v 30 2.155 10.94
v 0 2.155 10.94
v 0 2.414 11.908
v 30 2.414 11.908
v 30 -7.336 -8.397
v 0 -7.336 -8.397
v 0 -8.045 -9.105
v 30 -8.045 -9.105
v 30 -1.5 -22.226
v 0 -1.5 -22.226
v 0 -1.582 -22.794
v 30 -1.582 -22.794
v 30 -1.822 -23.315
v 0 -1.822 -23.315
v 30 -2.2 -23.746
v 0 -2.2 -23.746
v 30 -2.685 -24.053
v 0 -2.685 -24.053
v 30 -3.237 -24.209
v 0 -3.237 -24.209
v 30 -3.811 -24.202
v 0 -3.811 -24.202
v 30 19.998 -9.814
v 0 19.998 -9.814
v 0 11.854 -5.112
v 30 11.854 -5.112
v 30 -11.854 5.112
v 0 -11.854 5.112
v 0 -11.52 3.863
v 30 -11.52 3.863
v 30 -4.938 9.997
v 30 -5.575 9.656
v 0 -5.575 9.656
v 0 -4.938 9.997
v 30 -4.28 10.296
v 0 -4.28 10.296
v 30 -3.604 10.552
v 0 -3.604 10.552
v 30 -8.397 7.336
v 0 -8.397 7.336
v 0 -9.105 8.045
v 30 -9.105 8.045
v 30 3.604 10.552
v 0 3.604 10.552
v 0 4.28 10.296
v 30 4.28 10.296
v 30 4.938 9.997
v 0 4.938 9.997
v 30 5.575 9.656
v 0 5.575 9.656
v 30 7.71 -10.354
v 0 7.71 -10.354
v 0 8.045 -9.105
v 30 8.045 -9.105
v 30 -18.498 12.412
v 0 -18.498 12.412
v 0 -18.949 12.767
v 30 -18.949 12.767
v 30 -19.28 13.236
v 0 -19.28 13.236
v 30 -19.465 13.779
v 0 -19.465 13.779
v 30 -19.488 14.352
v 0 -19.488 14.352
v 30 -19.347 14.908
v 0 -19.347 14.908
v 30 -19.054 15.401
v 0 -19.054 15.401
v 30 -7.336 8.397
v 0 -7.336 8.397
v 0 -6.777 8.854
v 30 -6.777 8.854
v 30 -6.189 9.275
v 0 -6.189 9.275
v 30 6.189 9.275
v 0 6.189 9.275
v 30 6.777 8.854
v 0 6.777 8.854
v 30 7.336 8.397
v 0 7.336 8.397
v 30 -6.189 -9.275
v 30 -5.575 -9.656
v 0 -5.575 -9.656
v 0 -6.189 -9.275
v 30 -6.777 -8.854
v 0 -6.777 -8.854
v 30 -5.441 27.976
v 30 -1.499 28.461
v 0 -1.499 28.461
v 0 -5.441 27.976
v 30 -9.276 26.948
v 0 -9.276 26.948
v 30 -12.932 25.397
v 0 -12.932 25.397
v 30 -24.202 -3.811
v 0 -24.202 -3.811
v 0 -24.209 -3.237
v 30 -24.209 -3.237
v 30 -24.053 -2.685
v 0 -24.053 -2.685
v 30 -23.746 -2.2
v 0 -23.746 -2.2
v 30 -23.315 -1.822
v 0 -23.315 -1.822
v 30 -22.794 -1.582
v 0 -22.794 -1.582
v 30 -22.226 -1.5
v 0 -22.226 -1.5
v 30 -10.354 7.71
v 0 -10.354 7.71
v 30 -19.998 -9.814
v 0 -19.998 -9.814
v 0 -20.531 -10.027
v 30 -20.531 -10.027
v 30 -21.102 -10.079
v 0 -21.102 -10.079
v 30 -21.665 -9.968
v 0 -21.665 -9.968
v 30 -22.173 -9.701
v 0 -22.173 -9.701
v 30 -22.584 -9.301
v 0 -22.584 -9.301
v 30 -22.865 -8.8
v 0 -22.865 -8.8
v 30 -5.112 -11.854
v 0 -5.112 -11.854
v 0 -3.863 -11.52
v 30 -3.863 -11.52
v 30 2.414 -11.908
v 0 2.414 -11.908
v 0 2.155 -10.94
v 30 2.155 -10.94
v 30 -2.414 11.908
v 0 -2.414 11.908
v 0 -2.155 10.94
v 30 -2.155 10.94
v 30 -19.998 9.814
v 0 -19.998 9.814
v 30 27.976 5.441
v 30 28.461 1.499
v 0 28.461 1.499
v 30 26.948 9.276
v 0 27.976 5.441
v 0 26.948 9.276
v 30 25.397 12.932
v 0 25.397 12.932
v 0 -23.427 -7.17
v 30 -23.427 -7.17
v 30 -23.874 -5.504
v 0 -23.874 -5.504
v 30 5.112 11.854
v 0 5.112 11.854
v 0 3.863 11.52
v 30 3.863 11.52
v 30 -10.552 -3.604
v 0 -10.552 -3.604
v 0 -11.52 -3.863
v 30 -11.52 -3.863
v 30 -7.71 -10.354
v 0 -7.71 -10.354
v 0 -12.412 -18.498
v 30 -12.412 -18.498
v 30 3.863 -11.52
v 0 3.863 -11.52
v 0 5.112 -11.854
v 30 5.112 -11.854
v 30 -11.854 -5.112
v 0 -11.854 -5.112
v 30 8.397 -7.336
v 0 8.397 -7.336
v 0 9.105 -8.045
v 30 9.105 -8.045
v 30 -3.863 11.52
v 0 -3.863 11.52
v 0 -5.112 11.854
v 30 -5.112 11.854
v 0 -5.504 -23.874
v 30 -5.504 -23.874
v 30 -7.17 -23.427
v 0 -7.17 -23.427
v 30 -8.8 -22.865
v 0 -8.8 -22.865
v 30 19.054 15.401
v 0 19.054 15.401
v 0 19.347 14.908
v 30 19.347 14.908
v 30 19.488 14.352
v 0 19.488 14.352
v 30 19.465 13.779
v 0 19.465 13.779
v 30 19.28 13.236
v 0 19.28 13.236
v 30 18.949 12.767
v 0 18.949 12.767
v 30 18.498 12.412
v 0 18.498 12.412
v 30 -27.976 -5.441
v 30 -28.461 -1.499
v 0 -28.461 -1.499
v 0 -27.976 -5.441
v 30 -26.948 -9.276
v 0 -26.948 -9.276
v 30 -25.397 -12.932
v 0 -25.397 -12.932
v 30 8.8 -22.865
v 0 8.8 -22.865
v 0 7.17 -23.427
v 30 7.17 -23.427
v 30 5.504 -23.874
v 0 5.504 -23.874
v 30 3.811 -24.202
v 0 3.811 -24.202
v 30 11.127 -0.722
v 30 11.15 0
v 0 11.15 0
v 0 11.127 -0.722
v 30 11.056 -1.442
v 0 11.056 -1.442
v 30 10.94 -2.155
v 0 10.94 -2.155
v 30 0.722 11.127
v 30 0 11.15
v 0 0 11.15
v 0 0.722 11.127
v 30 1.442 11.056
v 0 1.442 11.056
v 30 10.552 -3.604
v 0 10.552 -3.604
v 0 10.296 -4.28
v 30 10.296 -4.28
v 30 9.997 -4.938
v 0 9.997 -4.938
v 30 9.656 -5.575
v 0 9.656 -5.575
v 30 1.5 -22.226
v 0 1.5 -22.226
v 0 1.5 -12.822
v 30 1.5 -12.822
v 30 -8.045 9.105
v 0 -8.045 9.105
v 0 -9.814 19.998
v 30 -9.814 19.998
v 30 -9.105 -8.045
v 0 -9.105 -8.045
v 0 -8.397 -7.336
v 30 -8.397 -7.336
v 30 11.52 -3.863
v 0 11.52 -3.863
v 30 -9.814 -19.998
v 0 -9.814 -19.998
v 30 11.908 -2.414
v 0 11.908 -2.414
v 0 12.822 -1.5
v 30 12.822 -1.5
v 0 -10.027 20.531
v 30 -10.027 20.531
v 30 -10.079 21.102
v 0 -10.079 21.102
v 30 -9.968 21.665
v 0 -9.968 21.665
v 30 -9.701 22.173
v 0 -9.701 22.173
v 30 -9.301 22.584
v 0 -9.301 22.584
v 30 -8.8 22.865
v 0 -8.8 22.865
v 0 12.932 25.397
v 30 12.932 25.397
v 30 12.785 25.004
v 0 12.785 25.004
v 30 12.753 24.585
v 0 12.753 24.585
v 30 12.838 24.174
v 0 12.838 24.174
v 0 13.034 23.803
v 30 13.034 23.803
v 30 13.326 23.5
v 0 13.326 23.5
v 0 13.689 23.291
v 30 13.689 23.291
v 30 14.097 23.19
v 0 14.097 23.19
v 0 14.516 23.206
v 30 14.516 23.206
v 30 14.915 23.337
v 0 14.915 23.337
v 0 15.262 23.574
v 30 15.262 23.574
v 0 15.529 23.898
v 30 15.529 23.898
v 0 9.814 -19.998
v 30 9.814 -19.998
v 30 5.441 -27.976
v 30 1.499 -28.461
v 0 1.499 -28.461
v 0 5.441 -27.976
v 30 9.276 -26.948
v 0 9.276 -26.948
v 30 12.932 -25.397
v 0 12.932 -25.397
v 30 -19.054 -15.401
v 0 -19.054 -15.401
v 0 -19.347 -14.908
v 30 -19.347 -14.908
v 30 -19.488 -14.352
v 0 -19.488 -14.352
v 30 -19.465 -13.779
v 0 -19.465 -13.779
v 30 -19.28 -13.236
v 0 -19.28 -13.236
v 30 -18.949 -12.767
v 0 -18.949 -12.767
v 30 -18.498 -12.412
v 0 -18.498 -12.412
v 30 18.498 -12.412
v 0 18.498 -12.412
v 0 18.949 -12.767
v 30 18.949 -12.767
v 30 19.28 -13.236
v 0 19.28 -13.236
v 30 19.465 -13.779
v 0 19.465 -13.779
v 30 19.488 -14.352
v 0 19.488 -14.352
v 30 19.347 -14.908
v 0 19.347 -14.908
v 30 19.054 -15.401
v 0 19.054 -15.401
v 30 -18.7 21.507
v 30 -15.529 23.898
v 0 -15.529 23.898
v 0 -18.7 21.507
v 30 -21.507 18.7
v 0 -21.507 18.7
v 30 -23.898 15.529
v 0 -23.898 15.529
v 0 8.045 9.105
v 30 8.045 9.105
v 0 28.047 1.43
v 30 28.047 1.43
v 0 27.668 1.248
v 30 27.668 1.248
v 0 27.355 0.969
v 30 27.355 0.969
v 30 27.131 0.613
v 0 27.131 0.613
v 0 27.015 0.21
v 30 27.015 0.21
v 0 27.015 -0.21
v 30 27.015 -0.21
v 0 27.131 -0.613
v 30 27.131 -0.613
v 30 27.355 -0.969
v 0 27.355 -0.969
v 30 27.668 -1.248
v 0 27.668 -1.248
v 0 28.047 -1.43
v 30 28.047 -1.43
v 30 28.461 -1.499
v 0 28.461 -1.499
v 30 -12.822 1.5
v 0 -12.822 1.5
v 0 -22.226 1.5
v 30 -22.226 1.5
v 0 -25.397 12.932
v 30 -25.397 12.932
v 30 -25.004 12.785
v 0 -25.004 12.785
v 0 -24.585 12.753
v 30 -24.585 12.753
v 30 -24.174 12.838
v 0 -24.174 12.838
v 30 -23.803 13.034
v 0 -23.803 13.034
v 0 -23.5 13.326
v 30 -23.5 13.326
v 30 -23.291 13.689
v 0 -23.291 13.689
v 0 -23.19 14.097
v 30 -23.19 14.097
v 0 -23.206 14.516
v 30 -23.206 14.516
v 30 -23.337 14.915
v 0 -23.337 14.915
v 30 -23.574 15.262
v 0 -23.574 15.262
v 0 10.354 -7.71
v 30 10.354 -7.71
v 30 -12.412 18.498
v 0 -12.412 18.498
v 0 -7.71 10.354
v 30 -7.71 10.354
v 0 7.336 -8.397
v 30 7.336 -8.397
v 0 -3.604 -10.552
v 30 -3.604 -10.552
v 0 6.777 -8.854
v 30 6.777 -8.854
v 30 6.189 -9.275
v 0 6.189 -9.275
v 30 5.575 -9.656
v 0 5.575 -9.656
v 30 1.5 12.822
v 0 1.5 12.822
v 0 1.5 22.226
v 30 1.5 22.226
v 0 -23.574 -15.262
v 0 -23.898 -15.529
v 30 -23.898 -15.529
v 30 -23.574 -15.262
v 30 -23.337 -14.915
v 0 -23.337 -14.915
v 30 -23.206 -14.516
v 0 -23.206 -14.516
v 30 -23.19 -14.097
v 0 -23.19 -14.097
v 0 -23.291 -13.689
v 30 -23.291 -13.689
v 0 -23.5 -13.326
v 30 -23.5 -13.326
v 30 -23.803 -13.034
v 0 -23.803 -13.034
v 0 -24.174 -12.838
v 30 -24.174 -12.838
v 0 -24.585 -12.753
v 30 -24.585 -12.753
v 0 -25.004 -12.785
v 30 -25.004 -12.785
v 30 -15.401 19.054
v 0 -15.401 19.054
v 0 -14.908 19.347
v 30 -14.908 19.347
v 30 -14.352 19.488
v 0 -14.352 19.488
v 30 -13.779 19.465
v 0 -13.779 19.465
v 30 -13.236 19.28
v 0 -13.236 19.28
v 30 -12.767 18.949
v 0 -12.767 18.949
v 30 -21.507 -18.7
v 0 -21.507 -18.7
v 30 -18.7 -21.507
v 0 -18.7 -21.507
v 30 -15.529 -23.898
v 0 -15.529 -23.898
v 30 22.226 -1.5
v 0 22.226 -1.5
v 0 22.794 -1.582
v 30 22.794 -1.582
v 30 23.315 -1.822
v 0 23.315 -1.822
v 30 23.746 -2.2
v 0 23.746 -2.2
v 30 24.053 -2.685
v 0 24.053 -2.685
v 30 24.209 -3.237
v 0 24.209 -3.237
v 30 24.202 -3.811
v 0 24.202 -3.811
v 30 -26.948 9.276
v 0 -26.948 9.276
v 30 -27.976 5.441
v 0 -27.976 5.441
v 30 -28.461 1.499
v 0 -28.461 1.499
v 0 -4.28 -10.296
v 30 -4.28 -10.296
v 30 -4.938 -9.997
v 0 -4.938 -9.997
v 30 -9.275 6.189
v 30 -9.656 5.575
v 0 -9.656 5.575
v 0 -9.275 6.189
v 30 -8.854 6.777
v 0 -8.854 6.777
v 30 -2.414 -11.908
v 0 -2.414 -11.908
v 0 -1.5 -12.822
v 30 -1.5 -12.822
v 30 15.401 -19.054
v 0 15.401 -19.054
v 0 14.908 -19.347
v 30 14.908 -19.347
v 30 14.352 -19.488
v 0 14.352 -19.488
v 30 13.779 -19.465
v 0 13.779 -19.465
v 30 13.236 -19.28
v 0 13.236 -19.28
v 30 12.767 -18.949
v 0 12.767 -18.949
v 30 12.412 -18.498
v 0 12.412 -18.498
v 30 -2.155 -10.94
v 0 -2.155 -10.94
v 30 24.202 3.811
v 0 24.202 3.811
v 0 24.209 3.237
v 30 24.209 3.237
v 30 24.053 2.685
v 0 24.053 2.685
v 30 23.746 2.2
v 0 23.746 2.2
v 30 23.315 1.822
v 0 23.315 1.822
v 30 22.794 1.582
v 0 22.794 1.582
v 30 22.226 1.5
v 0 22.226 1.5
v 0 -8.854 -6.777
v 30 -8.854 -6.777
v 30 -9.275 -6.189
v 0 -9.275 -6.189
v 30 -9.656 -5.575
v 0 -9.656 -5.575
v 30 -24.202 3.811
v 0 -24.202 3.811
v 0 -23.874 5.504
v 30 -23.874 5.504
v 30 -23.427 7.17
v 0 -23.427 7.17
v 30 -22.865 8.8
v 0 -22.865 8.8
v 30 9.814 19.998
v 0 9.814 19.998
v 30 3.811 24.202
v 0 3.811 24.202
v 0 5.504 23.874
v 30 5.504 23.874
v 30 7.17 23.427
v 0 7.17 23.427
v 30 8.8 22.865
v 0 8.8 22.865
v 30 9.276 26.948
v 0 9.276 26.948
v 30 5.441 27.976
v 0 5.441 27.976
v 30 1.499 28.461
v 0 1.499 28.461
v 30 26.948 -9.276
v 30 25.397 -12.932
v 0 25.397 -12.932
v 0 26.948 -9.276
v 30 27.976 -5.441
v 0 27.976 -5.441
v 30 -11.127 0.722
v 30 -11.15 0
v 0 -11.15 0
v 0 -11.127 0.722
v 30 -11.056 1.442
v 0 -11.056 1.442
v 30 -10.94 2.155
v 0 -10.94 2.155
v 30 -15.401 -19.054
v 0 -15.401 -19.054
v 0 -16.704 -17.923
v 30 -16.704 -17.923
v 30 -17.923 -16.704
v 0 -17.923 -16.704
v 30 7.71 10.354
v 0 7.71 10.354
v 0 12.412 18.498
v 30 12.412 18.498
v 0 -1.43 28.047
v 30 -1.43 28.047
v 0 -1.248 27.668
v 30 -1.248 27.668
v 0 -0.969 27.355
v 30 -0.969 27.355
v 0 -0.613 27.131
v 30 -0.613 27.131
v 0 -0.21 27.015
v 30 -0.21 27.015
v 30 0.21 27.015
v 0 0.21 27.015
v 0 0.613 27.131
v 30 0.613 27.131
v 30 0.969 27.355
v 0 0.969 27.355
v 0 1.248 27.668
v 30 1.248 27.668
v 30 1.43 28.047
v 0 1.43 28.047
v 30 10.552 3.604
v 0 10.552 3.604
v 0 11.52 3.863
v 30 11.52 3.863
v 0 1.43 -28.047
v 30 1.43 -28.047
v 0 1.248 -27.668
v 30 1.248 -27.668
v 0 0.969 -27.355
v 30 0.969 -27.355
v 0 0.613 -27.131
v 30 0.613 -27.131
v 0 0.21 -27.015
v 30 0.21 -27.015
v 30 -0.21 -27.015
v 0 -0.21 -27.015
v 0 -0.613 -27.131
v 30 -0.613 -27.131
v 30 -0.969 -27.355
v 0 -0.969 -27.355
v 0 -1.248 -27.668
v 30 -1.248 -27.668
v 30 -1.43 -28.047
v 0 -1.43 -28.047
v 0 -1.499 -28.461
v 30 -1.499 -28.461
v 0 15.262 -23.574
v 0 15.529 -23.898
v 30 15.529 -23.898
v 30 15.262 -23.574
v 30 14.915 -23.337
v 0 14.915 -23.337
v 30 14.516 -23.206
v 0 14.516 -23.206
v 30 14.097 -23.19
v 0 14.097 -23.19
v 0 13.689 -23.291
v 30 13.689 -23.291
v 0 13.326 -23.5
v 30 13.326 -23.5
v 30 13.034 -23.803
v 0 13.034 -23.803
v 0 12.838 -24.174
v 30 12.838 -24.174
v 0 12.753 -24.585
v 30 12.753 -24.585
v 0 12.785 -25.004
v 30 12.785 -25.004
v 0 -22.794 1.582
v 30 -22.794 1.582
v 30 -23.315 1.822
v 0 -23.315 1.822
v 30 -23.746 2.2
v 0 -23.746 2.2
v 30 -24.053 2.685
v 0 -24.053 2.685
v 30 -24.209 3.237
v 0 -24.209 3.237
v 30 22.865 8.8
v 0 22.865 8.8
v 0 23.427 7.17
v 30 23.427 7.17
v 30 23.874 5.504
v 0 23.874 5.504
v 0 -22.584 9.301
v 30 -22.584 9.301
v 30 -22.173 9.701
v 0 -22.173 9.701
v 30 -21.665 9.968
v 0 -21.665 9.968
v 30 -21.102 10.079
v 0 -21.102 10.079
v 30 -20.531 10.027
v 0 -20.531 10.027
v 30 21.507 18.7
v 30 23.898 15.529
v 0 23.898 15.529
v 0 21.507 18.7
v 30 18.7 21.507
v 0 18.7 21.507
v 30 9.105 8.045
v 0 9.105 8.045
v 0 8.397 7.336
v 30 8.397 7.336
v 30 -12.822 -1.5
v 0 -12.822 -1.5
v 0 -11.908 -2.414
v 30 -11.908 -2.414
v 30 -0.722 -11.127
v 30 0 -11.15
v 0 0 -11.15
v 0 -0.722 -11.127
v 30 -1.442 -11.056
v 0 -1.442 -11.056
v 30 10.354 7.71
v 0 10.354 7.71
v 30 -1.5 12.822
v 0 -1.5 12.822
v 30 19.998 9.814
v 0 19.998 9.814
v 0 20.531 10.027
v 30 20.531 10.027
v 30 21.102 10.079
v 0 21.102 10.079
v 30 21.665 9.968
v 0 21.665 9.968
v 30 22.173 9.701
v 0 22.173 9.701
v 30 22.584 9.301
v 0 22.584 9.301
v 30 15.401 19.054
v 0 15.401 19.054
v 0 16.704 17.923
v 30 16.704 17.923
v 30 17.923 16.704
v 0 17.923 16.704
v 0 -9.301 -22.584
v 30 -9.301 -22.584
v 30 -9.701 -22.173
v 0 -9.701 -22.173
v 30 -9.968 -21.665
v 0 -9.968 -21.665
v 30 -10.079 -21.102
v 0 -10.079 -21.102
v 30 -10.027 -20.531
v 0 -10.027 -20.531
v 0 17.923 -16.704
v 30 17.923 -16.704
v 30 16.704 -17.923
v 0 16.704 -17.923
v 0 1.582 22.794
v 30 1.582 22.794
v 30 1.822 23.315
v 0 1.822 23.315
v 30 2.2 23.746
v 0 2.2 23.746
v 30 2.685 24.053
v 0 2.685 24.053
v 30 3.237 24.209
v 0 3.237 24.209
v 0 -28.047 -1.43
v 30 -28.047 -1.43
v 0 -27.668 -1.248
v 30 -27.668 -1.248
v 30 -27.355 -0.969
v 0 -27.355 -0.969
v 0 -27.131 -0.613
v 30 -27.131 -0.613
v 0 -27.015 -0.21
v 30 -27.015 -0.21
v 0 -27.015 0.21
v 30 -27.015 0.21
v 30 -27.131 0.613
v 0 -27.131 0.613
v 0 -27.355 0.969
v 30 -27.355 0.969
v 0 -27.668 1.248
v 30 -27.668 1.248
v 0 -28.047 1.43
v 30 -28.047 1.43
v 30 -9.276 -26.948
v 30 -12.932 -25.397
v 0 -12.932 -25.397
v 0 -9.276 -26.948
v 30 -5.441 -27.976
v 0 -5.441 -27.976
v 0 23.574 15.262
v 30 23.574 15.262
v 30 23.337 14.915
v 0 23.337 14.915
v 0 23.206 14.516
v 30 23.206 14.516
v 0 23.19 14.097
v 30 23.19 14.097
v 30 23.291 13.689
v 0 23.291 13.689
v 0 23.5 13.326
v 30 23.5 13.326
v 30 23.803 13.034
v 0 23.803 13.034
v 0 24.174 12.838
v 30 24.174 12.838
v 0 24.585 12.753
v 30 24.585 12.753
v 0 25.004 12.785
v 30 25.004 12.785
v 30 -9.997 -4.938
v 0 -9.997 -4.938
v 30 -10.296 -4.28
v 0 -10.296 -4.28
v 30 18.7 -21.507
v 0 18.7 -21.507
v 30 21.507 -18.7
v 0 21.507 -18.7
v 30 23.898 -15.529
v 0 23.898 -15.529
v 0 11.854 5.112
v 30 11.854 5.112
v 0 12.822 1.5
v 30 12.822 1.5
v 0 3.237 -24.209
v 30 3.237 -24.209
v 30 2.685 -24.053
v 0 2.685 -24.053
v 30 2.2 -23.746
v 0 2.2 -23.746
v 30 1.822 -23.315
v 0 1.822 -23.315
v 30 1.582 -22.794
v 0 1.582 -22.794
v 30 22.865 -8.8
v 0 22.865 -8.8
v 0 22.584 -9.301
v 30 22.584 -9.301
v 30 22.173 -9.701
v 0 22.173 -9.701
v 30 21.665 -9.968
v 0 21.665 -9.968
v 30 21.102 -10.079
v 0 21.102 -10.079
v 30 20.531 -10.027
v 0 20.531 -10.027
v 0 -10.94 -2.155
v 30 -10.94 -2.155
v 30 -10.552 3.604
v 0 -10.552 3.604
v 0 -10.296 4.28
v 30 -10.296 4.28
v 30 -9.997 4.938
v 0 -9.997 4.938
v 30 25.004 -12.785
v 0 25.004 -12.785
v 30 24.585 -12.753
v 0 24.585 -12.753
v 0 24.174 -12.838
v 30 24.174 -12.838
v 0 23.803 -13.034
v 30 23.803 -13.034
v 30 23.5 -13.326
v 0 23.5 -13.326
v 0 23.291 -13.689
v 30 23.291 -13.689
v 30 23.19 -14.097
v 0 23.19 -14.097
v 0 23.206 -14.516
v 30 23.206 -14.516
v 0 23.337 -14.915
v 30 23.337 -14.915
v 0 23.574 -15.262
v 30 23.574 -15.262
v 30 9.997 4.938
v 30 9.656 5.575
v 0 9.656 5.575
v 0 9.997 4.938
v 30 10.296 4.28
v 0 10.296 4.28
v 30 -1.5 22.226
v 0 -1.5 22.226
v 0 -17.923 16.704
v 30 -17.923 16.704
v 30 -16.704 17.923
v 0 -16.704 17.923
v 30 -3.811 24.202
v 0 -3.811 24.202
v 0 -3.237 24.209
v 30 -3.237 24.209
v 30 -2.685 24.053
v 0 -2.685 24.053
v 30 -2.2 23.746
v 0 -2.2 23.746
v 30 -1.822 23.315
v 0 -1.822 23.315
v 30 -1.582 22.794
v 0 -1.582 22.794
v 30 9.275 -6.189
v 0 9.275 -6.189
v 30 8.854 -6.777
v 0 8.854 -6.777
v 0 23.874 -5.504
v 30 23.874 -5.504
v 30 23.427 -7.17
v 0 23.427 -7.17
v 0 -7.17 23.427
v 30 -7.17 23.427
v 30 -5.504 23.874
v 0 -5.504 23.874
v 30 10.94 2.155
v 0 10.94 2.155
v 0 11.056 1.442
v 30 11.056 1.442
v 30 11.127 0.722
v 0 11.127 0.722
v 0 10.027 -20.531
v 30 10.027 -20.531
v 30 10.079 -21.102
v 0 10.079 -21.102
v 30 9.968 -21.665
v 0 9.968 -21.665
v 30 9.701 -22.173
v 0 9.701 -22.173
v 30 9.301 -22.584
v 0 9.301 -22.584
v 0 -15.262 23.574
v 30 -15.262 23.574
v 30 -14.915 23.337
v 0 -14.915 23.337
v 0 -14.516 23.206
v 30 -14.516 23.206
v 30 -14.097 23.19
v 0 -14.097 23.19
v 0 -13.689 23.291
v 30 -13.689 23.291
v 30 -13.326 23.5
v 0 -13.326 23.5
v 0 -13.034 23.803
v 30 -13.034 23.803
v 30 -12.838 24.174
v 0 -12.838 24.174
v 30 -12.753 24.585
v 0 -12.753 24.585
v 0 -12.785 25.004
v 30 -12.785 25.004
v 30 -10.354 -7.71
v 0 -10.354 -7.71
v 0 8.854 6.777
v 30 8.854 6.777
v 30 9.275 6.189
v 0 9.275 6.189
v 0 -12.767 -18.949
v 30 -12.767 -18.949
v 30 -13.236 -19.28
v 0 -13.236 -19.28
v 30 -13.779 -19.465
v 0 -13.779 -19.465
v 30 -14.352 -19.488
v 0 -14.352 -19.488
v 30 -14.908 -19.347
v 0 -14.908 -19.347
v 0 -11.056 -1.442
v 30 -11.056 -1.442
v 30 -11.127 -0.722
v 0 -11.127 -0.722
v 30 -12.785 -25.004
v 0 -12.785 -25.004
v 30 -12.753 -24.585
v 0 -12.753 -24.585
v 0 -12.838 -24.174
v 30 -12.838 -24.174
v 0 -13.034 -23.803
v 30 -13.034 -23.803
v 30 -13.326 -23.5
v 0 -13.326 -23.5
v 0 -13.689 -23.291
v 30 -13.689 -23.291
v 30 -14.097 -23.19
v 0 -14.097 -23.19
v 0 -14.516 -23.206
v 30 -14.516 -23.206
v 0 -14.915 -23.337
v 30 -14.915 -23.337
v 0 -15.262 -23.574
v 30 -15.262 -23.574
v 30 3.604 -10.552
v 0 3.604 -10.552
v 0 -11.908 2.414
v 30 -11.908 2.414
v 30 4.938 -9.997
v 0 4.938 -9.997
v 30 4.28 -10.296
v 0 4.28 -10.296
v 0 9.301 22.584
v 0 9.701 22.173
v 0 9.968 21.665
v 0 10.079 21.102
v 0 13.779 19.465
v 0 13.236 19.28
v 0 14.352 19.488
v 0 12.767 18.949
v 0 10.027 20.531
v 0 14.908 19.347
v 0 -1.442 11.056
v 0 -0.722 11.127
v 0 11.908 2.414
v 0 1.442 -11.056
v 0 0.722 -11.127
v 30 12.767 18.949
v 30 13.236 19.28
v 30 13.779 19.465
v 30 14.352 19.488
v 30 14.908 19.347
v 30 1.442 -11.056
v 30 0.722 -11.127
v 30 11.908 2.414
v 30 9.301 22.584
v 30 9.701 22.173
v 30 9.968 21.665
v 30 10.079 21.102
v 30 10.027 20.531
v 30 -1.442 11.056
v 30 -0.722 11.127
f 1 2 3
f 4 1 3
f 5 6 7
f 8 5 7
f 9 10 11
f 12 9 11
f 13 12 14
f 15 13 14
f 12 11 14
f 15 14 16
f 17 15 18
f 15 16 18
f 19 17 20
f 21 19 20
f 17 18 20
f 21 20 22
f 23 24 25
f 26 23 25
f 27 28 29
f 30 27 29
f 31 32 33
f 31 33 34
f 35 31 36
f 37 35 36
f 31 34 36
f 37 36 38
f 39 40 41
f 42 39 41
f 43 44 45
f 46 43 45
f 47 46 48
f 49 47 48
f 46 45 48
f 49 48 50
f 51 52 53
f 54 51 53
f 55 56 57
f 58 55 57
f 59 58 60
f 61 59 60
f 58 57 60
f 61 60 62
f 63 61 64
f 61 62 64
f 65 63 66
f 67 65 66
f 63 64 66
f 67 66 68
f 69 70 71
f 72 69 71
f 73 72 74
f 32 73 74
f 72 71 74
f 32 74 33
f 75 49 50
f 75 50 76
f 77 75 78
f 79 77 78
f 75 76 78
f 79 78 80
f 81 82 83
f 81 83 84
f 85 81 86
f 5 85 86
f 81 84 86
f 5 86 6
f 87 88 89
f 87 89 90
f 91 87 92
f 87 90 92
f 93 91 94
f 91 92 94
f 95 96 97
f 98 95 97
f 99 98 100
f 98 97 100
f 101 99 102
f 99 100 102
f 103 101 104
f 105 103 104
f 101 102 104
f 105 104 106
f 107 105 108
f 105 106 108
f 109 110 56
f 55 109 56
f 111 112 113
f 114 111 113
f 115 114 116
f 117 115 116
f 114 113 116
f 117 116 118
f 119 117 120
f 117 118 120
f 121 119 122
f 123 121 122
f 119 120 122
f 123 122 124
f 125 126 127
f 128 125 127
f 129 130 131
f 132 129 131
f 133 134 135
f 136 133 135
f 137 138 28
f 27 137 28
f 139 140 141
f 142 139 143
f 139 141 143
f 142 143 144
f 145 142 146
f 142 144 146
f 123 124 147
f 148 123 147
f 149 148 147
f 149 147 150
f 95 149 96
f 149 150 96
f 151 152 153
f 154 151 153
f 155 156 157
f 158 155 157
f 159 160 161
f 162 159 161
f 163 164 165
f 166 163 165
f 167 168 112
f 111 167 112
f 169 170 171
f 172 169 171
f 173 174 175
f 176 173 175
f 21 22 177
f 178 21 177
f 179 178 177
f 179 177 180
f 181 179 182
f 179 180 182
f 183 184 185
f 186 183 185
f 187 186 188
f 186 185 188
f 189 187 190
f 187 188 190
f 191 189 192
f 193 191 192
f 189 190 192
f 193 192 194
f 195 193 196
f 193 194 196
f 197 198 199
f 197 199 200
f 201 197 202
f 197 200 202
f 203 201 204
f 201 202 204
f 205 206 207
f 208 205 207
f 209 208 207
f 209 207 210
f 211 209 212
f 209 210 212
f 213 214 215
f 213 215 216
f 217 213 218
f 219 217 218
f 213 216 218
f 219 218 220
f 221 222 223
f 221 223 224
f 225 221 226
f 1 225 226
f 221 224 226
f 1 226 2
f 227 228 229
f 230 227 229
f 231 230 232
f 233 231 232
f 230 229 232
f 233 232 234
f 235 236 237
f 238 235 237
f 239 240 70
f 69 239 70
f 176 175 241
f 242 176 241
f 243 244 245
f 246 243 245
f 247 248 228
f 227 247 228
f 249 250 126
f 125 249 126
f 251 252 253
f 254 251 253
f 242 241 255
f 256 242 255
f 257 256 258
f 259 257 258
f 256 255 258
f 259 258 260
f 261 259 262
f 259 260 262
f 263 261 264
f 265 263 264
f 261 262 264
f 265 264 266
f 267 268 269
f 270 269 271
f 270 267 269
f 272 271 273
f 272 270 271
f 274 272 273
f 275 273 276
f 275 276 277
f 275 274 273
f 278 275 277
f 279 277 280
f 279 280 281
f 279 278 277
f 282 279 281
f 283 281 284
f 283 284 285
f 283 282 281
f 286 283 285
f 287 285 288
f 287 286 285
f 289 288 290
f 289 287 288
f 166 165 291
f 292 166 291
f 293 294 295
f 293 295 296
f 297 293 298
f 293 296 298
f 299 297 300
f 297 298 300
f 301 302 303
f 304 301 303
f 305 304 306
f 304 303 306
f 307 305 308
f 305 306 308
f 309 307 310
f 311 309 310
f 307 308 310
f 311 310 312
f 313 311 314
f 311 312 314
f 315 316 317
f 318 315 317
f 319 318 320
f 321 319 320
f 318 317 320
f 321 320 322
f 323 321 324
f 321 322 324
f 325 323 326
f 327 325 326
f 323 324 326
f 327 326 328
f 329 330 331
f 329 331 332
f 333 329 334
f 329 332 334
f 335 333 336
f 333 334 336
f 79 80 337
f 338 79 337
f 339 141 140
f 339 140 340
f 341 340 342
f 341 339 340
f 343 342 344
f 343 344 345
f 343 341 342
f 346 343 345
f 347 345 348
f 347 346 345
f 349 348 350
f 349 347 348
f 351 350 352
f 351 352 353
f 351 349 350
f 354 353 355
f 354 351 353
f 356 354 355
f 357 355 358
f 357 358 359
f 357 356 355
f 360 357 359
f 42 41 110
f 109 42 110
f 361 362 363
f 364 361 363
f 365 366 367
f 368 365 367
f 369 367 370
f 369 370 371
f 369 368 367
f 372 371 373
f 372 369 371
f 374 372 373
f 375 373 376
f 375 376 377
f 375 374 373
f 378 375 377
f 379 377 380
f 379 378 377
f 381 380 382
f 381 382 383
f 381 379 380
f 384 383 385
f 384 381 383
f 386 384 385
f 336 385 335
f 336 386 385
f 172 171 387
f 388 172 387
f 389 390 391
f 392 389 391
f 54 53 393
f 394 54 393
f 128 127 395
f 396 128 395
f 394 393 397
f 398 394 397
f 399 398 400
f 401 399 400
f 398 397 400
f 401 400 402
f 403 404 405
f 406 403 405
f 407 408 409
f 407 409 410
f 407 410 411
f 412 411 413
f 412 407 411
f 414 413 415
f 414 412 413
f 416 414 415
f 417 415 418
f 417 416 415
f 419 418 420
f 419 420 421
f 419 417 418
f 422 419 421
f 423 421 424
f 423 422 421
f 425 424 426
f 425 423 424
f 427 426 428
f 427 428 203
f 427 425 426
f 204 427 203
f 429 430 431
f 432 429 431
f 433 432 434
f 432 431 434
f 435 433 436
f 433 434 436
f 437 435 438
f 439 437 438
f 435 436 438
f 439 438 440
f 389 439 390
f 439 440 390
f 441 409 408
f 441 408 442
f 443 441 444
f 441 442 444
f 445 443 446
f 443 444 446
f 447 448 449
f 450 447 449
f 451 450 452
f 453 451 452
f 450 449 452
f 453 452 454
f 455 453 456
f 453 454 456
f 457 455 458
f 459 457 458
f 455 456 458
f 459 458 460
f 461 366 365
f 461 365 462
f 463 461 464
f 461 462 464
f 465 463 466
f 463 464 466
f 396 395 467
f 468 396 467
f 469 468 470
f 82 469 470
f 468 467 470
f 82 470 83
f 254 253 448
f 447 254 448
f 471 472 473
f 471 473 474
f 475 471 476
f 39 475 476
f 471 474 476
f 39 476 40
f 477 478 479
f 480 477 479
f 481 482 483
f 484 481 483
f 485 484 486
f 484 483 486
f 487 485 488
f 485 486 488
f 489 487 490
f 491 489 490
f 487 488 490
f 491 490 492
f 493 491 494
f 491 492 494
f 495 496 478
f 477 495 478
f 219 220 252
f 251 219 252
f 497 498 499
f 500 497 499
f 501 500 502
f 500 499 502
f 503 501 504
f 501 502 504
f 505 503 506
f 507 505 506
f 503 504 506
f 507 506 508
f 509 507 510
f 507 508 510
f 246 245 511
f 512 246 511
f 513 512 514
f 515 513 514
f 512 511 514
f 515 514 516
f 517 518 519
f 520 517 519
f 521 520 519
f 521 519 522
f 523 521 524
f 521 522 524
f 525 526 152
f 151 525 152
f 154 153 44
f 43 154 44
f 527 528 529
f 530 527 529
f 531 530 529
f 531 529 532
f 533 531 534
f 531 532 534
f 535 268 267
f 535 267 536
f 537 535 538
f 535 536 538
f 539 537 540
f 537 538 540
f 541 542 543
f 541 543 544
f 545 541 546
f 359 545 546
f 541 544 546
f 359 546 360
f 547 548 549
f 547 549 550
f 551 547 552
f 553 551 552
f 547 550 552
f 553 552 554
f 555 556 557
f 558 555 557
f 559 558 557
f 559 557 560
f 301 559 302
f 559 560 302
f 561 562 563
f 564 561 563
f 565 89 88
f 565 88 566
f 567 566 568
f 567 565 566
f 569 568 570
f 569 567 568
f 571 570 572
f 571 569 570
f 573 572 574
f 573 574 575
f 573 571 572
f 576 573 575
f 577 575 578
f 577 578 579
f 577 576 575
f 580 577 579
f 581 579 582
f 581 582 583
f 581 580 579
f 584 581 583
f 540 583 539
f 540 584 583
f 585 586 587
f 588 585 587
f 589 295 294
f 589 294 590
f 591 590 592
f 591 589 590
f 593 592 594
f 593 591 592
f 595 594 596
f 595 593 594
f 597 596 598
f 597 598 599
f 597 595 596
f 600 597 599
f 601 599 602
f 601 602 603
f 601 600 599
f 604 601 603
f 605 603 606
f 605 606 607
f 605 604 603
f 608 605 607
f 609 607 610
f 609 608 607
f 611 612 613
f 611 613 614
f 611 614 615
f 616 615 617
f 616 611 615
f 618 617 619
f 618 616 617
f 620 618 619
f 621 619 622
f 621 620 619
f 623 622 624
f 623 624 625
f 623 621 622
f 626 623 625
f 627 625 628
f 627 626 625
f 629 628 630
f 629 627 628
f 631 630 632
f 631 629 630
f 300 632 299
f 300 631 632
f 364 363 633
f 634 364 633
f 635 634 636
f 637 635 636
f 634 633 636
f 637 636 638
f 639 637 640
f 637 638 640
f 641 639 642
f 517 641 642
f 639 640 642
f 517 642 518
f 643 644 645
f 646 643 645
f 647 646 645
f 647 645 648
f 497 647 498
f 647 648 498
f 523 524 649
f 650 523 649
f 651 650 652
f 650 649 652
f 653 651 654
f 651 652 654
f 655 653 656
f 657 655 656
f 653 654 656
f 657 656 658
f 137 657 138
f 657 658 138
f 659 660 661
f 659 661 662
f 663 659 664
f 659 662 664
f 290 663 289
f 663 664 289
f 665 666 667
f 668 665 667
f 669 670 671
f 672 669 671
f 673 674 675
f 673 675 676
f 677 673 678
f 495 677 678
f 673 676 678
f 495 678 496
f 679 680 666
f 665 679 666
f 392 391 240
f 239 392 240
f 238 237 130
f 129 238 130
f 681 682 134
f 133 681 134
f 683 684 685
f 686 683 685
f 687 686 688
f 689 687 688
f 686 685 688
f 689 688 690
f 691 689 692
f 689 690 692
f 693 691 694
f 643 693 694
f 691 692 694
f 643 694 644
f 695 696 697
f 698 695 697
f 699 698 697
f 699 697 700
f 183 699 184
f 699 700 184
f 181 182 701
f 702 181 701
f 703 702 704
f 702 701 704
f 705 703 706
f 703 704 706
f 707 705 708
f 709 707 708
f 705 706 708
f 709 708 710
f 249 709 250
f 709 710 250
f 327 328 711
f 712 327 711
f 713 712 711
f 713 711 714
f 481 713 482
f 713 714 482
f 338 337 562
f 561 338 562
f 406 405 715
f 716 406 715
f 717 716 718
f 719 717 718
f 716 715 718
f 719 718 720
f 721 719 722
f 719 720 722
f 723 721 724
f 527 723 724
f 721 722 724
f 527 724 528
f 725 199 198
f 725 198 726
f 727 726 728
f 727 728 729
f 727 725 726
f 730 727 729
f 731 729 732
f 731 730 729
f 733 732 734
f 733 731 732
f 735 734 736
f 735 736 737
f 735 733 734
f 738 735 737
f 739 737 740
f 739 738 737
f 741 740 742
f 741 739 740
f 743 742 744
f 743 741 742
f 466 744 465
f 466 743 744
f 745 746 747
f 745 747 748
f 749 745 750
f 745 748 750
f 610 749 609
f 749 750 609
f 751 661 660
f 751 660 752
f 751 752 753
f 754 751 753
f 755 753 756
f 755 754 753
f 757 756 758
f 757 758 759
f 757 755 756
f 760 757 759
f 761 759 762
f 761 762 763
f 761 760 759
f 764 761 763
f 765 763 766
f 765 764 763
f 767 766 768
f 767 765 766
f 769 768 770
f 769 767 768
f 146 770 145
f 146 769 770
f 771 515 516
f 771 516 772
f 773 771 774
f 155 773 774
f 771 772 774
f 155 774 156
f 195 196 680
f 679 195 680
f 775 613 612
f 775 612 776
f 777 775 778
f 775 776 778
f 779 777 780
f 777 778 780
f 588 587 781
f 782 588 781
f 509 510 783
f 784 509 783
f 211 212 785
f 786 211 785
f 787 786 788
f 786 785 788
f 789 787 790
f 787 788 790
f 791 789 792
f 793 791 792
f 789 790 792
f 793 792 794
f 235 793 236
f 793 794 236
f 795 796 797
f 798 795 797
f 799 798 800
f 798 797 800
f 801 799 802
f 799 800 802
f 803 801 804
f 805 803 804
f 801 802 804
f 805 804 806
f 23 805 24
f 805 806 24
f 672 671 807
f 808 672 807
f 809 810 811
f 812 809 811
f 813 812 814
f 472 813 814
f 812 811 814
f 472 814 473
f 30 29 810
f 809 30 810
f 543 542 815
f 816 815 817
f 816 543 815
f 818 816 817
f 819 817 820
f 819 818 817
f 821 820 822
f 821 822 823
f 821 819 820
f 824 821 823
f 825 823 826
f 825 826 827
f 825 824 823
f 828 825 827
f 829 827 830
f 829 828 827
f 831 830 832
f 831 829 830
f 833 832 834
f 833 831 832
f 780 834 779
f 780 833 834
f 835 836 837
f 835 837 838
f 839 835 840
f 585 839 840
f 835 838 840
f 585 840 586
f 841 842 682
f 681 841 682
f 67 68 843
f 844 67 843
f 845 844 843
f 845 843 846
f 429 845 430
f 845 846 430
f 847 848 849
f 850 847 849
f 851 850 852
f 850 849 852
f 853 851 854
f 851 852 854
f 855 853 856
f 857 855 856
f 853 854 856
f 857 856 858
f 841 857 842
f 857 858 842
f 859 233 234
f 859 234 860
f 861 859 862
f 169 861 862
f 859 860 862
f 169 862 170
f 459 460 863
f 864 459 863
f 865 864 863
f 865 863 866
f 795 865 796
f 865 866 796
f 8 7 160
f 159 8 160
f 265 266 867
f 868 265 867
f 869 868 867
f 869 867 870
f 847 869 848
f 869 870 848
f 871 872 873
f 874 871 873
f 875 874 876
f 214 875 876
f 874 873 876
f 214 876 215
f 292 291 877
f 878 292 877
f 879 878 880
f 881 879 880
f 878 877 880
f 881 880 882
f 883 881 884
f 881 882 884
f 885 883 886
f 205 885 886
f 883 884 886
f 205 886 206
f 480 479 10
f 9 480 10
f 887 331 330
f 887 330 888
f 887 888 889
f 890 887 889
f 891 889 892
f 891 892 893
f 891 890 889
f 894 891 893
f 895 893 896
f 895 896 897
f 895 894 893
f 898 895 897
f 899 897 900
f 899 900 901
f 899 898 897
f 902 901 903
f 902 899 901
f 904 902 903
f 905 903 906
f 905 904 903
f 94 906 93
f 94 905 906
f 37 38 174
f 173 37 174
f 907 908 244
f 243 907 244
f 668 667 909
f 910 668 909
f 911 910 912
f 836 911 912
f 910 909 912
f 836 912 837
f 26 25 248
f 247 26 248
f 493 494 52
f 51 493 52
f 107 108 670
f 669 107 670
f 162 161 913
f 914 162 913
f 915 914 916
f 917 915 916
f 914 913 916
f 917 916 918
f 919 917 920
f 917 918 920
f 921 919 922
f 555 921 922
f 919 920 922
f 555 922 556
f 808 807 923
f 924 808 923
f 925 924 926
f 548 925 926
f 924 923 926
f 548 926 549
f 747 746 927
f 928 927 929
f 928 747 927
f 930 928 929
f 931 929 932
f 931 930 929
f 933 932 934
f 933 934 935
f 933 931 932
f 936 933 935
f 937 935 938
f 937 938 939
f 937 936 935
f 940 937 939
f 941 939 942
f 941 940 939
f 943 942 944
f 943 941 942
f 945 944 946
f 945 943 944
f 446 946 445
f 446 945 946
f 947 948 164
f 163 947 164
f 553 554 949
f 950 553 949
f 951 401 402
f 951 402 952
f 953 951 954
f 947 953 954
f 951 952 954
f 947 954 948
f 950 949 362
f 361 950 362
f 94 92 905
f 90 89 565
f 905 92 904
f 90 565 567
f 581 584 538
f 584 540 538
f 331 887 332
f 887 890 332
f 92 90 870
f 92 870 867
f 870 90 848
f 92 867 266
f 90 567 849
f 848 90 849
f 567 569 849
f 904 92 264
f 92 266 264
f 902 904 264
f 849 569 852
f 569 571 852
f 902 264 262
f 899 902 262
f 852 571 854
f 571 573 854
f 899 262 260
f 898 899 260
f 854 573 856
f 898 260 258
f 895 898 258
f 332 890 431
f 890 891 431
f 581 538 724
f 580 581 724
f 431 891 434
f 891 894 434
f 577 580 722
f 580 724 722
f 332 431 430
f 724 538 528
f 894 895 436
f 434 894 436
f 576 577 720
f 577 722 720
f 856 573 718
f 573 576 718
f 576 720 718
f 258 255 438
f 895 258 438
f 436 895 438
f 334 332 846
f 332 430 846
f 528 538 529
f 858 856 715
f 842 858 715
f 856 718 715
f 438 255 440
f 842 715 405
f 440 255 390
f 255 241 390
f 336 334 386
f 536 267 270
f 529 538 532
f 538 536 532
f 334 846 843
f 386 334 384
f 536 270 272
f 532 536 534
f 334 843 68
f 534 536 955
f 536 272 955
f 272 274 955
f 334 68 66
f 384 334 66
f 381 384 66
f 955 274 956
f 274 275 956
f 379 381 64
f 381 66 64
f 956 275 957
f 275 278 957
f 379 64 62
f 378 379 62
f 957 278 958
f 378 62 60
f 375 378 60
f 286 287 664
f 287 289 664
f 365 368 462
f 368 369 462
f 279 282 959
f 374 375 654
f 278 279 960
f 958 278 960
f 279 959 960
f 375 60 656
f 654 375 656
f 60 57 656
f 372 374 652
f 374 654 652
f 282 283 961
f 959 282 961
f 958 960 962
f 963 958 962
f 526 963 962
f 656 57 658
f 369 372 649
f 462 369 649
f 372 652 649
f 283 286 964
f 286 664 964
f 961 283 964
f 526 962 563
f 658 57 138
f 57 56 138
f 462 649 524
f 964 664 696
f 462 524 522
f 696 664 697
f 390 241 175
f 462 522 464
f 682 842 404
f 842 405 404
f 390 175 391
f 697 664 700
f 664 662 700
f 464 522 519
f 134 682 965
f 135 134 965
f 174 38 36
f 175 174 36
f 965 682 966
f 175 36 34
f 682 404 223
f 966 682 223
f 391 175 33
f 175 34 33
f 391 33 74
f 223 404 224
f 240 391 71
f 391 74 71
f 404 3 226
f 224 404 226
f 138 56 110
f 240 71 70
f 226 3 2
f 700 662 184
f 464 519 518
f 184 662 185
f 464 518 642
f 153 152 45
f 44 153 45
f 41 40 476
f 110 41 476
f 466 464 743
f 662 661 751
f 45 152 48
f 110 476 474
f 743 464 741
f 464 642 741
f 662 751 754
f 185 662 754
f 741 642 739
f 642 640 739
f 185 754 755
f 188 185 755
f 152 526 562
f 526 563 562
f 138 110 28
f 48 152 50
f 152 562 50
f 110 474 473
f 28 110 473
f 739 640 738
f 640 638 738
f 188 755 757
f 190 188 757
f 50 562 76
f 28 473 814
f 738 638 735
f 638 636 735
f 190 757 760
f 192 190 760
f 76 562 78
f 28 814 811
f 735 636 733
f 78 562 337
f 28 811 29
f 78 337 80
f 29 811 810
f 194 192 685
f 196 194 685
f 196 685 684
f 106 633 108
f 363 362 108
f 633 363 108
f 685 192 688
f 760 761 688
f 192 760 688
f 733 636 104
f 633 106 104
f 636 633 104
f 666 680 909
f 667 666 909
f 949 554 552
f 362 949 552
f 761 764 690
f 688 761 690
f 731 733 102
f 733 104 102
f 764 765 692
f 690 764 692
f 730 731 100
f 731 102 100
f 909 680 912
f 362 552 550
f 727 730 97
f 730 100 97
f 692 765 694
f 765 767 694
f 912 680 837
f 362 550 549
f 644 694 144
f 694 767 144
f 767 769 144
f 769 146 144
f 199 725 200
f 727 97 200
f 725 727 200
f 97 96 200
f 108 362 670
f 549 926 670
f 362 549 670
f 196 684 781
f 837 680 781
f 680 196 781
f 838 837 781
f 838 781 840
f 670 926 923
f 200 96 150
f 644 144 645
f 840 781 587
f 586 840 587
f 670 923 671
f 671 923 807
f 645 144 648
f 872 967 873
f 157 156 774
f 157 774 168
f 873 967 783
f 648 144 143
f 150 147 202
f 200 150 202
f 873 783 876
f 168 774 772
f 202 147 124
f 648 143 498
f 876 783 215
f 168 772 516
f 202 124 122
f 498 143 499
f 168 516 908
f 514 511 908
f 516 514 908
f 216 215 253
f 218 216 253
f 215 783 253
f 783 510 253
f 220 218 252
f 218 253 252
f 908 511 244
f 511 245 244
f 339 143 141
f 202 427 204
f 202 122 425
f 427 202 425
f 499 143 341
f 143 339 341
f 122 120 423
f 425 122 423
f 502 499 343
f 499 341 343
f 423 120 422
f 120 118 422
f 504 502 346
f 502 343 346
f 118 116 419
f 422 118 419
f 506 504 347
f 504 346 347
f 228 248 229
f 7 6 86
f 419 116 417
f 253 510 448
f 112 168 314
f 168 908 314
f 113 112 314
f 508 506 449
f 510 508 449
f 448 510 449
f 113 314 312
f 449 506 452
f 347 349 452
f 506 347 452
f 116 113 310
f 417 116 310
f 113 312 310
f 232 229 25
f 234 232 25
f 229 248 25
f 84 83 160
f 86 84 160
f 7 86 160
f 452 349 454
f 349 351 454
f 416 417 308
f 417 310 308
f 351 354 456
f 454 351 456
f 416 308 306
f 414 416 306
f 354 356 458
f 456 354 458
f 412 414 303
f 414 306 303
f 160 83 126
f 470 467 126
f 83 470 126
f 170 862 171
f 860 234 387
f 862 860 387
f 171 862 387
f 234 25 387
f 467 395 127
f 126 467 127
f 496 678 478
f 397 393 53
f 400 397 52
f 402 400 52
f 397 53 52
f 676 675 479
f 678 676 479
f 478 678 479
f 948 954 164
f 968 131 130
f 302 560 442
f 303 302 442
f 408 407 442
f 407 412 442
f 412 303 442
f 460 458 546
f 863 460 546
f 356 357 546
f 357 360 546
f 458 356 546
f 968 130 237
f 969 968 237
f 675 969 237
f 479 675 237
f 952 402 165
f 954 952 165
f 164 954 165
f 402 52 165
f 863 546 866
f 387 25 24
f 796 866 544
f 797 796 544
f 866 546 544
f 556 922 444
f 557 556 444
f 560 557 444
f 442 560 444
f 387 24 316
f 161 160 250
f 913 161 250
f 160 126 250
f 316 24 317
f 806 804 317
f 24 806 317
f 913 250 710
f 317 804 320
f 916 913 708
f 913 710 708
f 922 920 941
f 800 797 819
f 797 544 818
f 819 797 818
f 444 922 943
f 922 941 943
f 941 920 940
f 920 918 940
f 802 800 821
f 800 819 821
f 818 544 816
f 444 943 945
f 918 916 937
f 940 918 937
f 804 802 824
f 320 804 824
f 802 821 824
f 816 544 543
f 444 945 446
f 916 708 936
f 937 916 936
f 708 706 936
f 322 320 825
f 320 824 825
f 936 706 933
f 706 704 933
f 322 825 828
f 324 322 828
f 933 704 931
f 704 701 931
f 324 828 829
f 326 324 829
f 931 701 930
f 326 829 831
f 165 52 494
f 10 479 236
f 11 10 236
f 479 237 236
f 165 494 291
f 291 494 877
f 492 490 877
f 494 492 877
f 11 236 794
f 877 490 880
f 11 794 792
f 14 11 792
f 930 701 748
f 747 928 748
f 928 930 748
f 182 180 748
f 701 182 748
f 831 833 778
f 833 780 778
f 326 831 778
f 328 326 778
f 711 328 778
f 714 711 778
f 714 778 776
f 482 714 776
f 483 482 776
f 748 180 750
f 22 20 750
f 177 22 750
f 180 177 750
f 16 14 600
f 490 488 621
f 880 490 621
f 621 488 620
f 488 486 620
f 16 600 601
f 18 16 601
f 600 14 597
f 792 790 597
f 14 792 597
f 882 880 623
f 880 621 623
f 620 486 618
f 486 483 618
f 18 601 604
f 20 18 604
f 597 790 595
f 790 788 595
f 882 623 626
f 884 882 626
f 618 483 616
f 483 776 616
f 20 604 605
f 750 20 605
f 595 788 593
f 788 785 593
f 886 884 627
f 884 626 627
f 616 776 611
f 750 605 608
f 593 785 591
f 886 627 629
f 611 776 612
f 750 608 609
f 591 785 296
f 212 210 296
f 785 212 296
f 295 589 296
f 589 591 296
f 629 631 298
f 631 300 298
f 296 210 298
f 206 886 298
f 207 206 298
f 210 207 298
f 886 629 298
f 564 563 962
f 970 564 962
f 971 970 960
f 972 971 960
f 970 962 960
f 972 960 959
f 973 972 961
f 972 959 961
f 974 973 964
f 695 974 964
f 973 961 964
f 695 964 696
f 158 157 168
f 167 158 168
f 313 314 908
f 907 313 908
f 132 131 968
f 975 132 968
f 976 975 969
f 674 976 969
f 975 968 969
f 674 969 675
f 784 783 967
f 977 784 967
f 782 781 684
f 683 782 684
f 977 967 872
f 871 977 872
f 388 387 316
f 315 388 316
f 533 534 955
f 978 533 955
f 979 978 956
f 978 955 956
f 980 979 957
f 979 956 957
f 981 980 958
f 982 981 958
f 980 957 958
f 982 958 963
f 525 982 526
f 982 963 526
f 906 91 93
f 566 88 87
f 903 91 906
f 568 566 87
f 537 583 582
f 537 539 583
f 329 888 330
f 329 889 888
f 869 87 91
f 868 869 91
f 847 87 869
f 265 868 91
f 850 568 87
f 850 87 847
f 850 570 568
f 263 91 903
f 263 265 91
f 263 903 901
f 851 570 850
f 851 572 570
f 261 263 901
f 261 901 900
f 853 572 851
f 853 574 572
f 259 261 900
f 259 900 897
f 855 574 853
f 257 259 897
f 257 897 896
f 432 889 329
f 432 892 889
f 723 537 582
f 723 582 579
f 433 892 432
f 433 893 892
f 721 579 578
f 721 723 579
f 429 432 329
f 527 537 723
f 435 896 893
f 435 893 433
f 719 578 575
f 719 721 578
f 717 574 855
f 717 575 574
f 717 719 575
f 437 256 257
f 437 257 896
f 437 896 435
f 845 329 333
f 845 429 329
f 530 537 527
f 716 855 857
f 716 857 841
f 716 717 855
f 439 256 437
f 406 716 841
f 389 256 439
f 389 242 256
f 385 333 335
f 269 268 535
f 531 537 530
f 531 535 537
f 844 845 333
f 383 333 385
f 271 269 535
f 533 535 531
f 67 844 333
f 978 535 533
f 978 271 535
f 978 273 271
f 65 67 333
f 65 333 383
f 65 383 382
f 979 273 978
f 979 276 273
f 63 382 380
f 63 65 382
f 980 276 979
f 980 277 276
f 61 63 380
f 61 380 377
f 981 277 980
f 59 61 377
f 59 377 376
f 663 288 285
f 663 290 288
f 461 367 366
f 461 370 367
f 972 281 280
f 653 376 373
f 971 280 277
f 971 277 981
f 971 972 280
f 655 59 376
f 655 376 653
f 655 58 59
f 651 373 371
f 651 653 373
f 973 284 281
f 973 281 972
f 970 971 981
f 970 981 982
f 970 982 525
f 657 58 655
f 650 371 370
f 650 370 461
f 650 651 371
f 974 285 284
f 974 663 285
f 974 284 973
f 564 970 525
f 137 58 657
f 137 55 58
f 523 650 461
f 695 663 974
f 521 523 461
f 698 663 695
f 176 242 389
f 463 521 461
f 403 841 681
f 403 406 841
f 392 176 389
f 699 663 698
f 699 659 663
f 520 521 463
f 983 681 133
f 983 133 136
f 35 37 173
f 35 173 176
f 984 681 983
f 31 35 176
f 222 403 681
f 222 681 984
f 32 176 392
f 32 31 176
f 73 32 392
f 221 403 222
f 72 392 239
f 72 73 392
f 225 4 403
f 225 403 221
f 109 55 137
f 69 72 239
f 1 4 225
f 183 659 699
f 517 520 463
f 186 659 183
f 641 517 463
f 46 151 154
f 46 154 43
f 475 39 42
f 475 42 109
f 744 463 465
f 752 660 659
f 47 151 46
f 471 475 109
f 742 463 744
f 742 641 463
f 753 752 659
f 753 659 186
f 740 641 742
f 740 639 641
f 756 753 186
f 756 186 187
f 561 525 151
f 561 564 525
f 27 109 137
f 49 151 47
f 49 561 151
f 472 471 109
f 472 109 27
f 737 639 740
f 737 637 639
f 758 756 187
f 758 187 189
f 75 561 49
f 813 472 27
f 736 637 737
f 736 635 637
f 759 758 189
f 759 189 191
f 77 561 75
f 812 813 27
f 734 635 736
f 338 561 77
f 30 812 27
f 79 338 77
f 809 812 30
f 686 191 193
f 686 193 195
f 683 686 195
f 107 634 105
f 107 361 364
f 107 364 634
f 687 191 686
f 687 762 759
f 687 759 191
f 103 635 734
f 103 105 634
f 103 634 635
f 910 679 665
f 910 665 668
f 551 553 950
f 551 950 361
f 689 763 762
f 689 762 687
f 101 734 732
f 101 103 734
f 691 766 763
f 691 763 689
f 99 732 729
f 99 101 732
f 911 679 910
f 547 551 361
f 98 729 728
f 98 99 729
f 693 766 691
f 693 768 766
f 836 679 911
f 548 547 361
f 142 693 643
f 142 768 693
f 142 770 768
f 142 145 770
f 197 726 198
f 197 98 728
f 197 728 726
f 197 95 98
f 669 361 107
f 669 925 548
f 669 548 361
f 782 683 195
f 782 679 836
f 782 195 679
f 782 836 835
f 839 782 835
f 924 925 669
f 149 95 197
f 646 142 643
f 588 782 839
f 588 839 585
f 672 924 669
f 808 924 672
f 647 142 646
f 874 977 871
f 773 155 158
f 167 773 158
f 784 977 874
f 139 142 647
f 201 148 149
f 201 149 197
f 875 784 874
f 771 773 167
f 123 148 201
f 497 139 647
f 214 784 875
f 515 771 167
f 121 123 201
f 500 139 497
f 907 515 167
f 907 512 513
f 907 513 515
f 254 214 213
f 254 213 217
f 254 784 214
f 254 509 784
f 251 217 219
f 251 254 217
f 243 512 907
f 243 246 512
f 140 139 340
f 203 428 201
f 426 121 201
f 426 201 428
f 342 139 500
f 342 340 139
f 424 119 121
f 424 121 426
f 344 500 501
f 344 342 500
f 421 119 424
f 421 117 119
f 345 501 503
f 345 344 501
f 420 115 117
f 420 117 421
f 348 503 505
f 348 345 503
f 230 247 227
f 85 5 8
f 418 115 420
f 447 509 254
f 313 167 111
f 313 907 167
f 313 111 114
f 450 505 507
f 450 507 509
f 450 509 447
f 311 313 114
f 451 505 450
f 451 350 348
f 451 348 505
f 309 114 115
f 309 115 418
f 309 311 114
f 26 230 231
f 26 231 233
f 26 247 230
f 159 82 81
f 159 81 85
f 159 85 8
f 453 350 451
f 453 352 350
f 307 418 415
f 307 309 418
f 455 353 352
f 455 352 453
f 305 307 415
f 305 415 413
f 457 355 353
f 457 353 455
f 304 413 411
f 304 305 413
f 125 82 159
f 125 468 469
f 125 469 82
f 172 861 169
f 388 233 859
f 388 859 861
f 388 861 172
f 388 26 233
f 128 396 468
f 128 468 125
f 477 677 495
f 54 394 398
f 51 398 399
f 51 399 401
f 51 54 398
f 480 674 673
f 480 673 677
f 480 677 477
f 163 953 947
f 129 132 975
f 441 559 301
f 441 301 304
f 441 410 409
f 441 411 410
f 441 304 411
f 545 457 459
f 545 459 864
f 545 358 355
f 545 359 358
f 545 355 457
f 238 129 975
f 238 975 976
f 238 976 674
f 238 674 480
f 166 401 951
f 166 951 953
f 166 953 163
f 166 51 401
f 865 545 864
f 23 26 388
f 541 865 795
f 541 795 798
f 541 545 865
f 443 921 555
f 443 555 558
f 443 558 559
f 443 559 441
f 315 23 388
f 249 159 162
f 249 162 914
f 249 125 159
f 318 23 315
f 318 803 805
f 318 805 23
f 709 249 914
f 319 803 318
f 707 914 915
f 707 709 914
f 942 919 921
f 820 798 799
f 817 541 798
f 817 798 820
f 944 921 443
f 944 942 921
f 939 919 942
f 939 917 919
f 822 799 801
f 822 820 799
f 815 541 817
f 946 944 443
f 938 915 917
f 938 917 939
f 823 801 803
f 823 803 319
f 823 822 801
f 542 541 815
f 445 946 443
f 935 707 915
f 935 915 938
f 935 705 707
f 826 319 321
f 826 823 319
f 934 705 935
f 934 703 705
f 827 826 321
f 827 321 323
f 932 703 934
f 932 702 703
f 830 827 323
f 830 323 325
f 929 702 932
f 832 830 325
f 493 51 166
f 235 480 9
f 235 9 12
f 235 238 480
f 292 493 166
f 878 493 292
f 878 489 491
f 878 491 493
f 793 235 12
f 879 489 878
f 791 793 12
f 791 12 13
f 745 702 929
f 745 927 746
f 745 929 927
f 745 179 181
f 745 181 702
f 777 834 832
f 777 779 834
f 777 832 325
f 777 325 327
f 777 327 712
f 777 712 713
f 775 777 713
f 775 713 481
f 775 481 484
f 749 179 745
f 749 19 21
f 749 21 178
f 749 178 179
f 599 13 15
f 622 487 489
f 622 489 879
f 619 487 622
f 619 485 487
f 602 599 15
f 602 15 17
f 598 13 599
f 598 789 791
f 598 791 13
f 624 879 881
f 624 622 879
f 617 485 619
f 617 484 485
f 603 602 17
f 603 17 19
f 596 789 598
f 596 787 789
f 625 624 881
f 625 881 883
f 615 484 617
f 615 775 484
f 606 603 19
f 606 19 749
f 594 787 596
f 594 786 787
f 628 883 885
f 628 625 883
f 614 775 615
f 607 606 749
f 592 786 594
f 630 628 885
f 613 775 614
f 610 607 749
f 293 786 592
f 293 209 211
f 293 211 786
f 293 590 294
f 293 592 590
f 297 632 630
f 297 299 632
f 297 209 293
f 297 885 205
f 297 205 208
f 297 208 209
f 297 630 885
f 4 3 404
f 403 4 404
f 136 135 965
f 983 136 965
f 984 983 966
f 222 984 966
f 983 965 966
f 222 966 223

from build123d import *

# Parameters (mm, degrees)
BOSS_EXTRUDE1_DEPTH = 30
CIRPATTERN1_COUNT   = 12
SKETCH4_R           = 1.5
CUT_EXTRUDE1_DEPTH  = 30
CIRPATTERN2_COUNT   = 12


with BuildPart() as part:
    # Sketch3 → Boss-Extrude1 (new body)
    with BuildSketch(Plane(origin=(0, 0, 0), x_dir=(0, 0, -1), z_dir=(1, 0, 0))):
        with BuildLine():
            Line((-14.25, 24.681724008), (-5.575, 9.656183252))
            ThreePointArc((-5.575, 9.656183252), (-4.611154785, 10.151834886), (-3.603740814, 10.551566336))
            Line((-3.603740814, 10.551566336), (-3.863098868, 11.519503771))
            Line((-3.863098868, 11.519503771), (-5.111933128, 11.854127903))
            Line((-5.111933128, 11.854127903), (-9.81401728, 19.998376555))
            ThreePointArc((-9.81401728, 19.998376555), (-9.96754629, 21.665151442), (-8.800363492, 22.864898915))
            ThreePointArc((-8.800363492, 22.864898915), (-6.341066605, 23.665182744), (-3.811111111, 24.201765062))
            ThreePointArc((-3.811111111, 24.201765062), (-2.200427421, 23.746344671), (-1.5, 22.226110771))
            Line((-1.5, 22.226110771), (-1.5, 12.821942467))
            Line((-1.5, 12.821942467), (-2.414210129, 11.907732339))
            Line((-2.414210129, 11.907732339), (-2.154852075, 10.939794904))
            ThreePointArc((-2.154852075, 10.939794904), (-1.082540259, 11.097324299), (0, 11.15))
            Line((0, 11.15), (0, 28.5))
            ThreePointArc((0, 28.5), (-7.376342785, 27.528886049), (-14.25, 24.681724008))
        make_face()
    boss_extrude1 = extrude(amount=BOSS_EXTRUDE1_DEPTH)

    # CirPattern1: Boss-Extrude1 ×12 about axis
    cirpattern1_axis = Axis((-2, 0, 0), (1, 0, 0))
    for i in range(1, CIRPATTERN1_COUNT):
        add(boss_extrude1.rotate(cirpattern1_axis, i * 360 / CIRPATTERN1_COUNT))

    # Sketch4 → Cut-Extrude1 (cut)
    with BuildSketch(Plane(origin=(0, 0, 0), x_dir=(0, 0, -1), z_dir=(1, 0, 0))):
        with Locations((0, 28.5)):
            Circle(SKETCH4_R)
    cut_extrude1 = extrude(amount=CUT_EXTRUDE1_DEPTH, mode=Mode.SUBTRACT)

    # CirPattern2: Cut-Extrude1 ×12 about axis
    cirpattern2_axis = Axis((-2, 0, 0), (1, 0, 0))
    for i in range(1, CIRPATTERN2_COUNT):
        add(cut_extrude1.rotate(cirpattern2_axis, i * 360 / CIRPATTERN2_COUNT), mode=Mode.SUBTRACT)


solid = part.part
